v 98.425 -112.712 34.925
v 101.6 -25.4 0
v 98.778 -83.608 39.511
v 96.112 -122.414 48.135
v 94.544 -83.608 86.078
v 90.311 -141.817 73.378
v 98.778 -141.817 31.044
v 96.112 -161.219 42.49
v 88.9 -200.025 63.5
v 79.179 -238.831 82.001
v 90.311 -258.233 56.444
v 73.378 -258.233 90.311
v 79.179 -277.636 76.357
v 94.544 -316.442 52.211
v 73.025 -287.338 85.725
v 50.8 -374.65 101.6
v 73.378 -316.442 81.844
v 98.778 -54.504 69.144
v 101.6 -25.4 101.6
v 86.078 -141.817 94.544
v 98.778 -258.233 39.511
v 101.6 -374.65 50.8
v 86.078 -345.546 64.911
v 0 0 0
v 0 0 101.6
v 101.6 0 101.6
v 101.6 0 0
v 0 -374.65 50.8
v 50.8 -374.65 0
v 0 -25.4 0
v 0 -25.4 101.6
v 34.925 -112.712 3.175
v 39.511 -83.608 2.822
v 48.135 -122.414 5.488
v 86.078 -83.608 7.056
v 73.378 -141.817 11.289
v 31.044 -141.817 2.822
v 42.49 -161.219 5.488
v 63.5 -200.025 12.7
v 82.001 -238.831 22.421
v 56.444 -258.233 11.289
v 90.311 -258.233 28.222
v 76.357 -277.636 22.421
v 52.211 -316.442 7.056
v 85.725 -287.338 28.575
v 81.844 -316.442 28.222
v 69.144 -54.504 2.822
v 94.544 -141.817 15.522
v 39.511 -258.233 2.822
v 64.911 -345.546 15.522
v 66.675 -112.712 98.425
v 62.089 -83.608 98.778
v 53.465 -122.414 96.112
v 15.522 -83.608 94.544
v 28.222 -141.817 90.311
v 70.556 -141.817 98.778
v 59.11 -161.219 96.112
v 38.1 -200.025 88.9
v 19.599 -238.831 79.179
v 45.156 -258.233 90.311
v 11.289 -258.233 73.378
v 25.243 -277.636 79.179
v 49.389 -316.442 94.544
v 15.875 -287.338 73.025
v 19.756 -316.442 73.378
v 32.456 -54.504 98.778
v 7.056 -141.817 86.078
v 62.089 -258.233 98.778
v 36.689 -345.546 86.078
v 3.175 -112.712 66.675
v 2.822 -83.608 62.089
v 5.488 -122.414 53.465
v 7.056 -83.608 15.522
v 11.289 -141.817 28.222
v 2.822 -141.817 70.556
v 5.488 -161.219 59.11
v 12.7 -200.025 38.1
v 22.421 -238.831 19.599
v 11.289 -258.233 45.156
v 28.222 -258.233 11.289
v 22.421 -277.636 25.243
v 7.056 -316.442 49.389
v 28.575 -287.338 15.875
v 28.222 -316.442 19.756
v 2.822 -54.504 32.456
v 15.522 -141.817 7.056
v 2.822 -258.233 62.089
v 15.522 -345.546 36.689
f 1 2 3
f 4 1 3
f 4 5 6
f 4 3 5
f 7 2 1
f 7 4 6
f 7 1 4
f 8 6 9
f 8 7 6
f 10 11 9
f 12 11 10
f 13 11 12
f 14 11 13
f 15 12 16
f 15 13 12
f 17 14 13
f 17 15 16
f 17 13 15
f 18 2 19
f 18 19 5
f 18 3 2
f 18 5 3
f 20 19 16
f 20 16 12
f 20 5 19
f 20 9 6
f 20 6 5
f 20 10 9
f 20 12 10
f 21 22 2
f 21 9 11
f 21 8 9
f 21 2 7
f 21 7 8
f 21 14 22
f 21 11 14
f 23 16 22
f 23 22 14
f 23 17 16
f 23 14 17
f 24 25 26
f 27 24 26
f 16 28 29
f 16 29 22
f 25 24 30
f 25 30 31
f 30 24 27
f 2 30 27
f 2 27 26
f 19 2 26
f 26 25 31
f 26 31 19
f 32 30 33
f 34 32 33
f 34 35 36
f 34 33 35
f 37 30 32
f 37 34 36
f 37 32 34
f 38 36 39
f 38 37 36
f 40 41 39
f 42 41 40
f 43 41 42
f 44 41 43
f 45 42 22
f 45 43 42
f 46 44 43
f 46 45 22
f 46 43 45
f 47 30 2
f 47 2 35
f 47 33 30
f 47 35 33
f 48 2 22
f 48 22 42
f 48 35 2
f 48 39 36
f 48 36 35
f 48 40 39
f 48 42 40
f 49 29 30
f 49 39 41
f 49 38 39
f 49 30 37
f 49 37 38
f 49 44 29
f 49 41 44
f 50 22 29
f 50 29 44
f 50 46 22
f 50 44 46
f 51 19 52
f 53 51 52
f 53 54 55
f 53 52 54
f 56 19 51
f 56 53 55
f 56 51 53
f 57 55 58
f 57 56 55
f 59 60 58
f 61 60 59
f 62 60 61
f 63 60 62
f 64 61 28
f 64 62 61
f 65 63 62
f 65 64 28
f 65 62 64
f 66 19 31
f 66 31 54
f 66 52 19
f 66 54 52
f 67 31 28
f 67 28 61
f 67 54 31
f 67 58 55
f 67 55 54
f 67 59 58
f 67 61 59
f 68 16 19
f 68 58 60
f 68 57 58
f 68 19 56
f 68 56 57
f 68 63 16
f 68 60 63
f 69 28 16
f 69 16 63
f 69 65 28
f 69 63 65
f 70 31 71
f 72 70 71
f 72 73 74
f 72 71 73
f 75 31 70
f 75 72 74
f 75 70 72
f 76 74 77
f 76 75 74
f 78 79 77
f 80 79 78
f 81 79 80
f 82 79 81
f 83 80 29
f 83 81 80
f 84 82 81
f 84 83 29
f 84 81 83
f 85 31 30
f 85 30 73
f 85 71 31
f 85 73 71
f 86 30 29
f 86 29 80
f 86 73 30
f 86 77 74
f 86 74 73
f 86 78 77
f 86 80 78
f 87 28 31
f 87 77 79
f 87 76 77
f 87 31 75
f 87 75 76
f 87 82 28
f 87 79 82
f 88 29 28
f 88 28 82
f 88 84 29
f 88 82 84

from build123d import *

# Parameters (mm, degrees)
F0_W      = 101.6
F0_H      = 101.6
F1_DEPTH  = 25.4
F1_FACE_W = 101.6
F1_FACE_H = 101.6


with BuildPart() as f1:
    # F0 (on Front) → F1 (new body)
    with BuildSketch(Plane.XZ):
        with Locations((50.8, 50.8)):
            Rectangle(F0_W, F0_H)
    extrude(amount=F1_DEPTH)

    # F1_face (on face) → F4 section 0
    with BuildSketch(Plane(origin=(50.8, -25.4, 50.8), x_dir=(1, 0, 0), z_dir=(0, -1, 0))):
        Rectangle(F1_FACE_W, F1_FACE_H)
    # F3 (on offset) → F4 section 1
    with BuildSketch(Plane.XZ.offset(374.65)):
        Polygon((0, 50.8), (50.8, 0), (101.6, 50.8), (50.8, 101.6), align=None)
    loft()


solid = f1.part
